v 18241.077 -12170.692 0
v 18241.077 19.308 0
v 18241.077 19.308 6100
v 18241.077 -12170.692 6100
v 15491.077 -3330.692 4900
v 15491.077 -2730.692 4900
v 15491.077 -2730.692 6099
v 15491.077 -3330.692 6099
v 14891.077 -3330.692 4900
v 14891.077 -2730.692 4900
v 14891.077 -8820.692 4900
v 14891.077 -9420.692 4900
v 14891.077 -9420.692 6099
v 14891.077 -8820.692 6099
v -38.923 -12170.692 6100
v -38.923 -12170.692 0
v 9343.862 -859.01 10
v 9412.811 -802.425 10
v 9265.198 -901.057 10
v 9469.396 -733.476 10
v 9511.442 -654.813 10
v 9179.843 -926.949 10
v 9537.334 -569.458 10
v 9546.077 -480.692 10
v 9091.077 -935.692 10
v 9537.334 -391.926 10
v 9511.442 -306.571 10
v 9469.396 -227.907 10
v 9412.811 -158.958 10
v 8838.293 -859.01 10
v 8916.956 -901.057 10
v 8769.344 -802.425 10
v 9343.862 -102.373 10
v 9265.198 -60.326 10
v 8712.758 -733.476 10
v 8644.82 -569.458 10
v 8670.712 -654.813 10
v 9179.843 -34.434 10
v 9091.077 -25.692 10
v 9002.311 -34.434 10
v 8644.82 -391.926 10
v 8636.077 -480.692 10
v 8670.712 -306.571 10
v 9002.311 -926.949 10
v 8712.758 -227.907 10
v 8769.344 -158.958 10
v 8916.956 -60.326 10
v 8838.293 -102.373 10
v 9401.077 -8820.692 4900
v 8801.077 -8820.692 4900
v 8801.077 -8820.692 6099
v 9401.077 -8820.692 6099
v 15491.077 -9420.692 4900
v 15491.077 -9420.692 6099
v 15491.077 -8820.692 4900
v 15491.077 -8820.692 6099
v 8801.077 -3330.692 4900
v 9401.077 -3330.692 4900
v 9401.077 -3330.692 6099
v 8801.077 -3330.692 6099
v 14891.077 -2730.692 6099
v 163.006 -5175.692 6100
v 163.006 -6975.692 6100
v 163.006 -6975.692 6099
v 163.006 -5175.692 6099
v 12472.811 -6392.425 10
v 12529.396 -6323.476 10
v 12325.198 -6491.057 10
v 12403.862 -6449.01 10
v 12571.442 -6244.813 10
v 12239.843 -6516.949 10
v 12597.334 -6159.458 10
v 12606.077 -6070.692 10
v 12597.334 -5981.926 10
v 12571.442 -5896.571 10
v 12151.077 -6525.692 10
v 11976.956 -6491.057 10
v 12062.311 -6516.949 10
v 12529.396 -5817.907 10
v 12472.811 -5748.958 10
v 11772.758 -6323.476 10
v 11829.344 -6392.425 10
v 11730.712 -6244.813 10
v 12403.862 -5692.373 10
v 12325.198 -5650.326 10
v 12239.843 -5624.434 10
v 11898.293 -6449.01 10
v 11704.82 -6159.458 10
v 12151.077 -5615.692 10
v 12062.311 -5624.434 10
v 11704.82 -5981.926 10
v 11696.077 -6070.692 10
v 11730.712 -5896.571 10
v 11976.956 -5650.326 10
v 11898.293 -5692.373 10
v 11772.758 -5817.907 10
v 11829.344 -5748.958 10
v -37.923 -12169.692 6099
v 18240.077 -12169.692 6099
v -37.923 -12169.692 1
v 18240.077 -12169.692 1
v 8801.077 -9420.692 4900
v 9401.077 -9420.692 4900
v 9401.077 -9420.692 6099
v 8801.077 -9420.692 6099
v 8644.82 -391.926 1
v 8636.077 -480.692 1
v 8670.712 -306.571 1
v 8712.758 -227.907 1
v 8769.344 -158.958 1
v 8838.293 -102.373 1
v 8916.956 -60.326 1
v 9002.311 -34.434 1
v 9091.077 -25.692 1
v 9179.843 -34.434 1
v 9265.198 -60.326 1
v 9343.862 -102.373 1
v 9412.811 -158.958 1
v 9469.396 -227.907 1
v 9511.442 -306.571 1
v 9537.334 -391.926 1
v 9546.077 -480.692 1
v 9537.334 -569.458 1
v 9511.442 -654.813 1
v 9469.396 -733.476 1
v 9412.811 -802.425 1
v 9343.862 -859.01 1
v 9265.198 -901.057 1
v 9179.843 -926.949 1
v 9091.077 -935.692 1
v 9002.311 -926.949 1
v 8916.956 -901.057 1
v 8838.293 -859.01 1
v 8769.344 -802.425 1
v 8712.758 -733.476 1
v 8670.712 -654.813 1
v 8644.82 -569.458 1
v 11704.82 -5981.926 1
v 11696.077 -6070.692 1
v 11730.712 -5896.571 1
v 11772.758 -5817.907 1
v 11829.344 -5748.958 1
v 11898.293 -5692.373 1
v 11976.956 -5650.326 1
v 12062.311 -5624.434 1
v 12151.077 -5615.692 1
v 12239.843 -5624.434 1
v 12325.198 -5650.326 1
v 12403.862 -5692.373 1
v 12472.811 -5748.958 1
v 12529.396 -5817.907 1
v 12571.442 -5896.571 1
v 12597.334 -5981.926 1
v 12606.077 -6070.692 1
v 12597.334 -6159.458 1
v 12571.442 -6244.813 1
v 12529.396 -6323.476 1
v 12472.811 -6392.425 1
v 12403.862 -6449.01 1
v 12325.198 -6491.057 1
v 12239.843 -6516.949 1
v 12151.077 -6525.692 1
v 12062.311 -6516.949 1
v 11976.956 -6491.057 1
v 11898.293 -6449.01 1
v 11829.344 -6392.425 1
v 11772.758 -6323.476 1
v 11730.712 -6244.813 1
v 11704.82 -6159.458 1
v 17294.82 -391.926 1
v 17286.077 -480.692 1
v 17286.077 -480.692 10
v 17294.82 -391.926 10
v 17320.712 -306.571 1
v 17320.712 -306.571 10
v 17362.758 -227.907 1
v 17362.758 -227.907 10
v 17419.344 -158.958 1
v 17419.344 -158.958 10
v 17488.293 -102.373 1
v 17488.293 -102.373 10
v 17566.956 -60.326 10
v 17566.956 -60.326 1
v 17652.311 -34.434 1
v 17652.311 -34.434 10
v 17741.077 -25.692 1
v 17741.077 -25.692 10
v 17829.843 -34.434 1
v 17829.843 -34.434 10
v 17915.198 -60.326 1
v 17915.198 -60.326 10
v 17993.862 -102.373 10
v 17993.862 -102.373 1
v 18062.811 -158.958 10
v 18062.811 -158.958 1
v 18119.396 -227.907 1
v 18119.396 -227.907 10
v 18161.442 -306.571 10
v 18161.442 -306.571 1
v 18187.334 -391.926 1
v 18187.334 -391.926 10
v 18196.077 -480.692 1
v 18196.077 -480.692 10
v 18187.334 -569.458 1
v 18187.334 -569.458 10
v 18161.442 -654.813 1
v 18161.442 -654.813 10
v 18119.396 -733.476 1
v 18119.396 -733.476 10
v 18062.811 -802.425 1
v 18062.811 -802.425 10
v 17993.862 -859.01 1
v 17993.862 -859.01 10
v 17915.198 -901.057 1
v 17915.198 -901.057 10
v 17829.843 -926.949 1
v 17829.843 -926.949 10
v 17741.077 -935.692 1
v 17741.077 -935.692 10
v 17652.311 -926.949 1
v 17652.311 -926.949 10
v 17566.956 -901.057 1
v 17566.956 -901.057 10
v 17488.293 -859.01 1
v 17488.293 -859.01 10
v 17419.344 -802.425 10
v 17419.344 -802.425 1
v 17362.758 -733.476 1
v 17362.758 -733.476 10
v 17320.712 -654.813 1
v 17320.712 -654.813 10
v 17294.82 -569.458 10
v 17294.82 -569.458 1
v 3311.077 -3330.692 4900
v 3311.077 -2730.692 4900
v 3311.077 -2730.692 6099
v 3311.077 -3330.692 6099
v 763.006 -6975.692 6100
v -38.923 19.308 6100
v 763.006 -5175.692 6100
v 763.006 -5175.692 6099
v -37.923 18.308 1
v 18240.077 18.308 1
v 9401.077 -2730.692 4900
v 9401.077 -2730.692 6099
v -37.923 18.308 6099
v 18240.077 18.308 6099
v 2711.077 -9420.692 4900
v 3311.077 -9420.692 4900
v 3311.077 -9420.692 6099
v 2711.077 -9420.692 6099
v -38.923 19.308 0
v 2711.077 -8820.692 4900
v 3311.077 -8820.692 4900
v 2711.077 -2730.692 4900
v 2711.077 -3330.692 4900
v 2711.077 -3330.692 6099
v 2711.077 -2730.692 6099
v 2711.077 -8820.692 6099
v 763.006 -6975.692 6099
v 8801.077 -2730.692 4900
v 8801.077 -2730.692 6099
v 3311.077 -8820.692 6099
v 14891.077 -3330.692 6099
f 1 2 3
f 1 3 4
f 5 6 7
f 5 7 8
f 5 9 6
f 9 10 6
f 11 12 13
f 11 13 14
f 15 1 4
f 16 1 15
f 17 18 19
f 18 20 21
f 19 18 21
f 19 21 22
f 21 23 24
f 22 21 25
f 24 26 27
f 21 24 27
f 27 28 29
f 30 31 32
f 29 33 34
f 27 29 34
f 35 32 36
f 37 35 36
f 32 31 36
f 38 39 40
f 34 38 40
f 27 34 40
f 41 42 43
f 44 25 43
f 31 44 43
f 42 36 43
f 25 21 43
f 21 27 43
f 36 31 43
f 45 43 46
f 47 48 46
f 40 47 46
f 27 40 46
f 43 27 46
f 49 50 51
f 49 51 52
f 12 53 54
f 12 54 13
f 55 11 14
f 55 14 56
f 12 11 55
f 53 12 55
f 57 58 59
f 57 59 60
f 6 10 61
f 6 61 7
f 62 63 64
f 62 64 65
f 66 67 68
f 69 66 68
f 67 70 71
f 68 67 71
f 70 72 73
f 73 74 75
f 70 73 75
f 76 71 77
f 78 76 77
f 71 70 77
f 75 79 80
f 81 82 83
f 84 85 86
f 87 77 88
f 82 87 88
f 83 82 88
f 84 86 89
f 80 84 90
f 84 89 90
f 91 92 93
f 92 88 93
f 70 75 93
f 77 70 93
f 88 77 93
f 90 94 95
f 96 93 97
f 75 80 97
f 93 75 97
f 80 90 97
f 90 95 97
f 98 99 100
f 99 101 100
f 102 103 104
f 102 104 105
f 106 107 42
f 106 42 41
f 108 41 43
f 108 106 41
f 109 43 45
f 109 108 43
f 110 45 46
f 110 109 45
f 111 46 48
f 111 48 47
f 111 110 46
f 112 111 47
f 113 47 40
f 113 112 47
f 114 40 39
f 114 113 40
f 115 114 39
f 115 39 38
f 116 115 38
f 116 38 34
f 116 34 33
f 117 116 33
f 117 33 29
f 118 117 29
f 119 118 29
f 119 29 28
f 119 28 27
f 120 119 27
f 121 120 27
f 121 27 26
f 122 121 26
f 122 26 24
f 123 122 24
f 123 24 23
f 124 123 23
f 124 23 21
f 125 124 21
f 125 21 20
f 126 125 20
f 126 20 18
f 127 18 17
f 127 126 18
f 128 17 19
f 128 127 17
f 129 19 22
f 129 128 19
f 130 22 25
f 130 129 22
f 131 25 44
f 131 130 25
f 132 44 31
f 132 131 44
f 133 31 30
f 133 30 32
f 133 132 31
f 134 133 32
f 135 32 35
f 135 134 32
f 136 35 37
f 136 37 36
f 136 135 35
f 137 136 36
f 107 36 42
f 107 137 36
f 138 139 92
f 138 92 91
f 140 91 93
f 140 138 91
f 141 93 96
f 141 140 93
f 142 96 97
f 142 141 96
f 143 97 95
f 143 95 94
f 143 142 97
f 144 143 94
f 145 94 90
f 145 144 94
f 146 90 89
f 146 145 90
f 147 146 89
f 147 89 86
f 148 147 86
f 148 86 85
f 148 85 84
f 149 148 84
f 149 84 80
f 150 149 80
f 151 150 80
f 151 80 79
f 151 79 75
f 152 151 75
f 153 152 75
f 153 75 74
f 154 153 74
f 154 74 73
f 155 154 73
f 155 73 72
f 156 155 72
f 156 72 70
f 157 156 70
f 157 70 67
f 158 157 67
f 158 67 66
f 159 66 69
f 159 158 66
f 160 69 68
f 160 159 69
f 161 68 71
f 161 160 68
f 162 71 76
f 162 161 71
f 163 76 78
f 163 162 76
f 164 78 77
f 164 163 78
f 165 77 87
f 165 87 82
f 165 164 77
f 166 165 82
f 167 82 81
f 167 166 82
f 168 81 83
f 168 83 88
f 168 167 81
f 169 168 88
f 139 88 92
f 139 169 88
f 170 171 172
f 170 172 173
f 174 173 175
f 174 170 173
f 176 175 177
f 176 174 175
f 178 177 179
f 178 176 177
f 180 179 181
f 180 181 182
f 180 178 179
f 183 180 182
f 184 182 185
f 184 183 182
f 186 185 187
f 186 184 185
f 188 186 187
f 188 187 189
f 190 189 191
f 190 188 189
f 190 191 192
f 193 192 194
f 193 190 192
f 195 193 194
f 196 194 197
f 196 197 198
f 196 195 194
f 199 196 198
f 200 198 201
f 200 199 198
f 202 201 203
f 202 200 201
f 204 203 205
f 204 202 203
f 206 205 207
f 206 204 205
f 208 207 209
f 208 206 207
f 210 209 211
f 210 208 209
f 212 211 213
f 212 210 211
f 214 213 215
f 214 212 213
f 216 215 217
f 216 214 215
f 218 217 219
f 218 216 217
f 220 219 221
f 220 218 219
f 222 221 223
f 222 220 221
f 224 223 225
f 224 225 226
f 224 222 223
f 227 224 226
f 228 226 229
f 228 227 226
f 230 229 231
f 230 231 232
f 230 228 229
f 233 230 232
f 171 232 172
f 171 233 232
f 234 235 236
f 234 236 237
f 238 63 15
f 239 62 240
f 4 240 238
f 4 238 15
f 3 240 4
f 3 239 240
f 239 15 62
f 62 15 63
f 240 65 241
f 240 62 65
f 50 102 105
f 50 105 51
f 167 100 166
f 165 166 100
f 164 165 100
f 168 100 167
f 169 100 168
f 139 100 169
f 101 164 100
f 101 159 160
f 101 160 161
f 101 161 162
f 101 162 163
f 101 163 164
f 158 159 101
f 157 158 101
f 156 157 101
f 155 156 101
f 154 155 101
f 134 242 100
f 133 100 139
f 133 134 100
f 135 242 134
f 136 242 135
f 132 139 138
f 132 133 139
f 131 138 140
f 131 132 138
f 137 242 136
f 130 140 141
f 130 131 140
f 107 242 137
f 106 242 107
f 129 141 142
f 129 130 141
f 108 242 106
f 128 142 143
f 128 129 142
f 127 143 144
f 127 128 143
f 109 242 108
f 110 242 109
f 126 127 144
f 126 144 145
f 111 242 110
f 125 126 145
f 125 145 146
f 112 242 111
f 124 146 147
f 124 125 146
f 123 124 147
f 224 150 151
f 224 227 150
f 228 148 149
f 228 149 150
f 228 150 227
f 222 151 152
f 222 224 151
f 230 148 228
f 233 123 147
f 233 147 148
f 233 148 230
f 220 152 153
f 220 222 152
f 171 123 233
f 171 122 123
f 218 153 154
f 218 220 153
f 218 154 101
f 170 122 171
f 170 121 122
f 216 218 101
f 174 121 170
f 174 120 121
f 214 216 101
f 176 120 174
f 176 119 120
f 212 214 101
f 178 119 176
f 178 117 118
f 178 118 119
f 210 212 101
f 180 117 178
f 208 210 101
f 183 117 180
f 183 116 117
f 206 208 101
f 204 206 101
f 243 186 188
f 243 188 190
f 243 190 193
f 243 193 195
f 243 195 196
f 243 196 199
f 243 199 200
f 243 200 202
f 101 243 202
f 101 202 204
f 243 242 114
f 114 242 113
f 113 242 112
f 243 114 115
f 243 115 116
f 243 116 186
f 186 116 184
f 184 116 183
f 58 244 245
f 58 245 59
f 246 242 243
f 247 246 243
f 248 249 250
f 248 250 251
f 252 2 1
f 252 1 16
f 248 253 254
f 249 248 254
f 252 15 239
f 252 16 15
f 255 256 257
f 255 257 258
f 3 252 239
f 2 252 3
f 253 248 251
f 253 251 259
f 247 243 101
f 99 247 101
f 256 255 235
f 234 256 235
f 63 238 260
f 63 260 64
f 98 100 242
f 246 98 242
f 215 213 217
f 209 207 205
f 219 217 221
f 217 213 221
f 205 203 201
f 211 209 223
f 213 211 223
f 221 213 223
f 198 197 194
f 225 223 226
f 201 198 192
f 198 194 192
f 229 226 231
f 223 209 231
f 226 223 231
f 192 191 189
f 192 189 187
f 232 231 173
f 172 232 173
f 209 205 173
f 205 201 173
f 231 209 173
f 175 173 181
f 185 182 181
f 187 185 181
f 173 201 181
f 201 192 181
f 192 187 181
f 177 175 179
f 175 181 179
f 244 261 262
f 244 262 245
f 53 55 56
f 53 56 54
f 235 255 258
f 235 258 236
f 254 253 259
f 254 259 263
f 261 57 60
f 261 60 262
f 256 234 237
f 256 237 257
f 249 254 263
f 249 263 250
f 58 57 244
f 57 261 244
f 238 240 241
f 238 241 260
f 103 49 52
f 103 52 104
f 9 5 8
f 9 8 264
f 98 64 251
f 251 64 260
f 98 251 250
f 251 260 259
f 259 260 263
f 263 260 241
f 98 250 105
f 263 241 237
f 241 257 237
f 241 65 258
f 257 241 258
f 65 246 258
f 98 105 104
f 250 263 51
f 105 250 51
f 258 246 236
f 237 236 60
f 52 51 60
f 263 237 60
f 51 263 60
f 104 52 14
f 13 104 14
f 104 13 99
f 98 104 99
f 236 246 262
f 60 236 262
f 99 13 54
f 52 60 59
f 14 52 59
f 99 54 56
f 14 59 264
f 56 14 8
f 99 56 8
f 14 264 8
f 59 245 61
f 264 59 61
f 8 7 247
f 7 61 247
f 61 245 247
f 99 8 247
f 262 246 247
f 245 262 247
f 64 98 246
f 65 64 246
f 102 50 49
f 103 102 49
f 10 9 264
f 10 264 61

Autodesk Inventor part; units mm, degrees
ref_plane "YZ Plane" through (0, 0, 0) normal (1, 0, 0) x (0, 1, 0)
ref_plane "XZ Plane" through (0, 0, 0) normal (0, 1, 0) x (-1, 0, 0)
ref_plane "XY Plane" through (0, 0, 0) normal (0, 0, 1) x (1, 0, 0)
sketch "Sketch1" plane through (0, 0, 0) normal (0, 0, 1) x (1, 0, 0)
  line L0 (-38.9229, 19.3084) -> (18241.0771, 19.3084)
  line L1 (18241.0771, 19.3084) -> (18241.0771, -12170.6916)
  line L2 (18241.0771, -12170.6916) -> (-38.9229, -12170.6916)
  line L3 (-38.9229, -12170.6916) -> (-38.9229, 19.3084)
  dimension "d0" = 18280
  dimension "d1" = 12190
extrude "Extrusion1" add sketch "Sketch1" along normal blind 6100
sketch "Sketch2" plane through (0, 0, 6100) normal (0, 0, 1) x (1, 0, 0)
  line L0 (18241.0771, 19.3084) -> (18241.0771, -12170.6916) projected
  line L1 (-38.9229, 19.3084) -> (18241.0771, 19.3084) projected
  line L2 (-38.9229, -12170.6916) -> (-38.9229, 19.3084) projected
  line L3 (18241.0771, -12170.6916) -> (-38.9229, -12170.6916) projected
  line L4 (163.0061, -5175.6916) -> (763.0061, -5175.6916)
  line L5 (763.0061, -5175.6916) -> (763.0061, -6975.6916)
  line L6 (763.0061, -6975.6916) -> (163.0061, -6975.6916)
  line L7 (163.0061, -6975.6916) -> (163.0061, -5175.6916)
  line L8 (2711.0771, -2730.6916) -> (3311.0771, -2730.6916)
  line L9 (3311.0771, -2730.6916) -> (3311.0771, -3330.6916)
  line L10 (3311.0771, -3330.6916) -> (2711.0771, -3330.6916)
  line L11 (2711.0771, -3330.6916) -> (2711.0771, -2730.6916)
  line L12 (8801.0771, -2730.6916) -> (9401.0771, -2730.6916)
  line L13 (9401.0771, -2730.6916) -> (9401.0771, -3330.6916)
  line L14 (9401.0771, -3330.6916) -> (8801.0771, -3330.6916)
  line L15 (8801.0771, -3330.6916) -> (8801.0771, -2730.6916)
  line L16 (14891.0771, -2730.6916) -> (15491.0771, -2730.6916)
  line L17 (15491.0771, -2730.6916) -> (15491.0771, -3330.6916)
  line L18 (15491.0771, -3330.6916) -> (14891.0771, -3330.6916)
  line L19 (14891.0771, -3330.6916) -> (14891.0771, -2730.6916)
  line L20 (2711.0771, -8820.6916) -> (3311.0771, -8820.6916)
  line L21 (3311.0771, -8820.6916) -> (3311.0771, -9420.6916)
  line L22 (3311.0771, -9420.6916) -> (2711.0771, -9420.6916)
  line L23 (2711.0771, -9420.6916) -> (2711.0771, -8820.6916)
  line L24 (8801.0771, -8820.6916) -> (9401.0771, -8820.6916)
  line L25 (9401.0771, -8820.6916) -> (9401.0771, -9420.6916)
  line L26 (9401.0771, -9420.6916) -> (8801.0771, -9420.6916)
  line L27 (8801.0771, -9420.6916) -> (8801.0771, -8820.6916)
  line L28 (14891.0771, -8820.6916) -> (15491.0771, -8820.6916)
  line L29 (15491.0771, -8820.6916) -> (15491.0771, -9420.6916)
  line L30 (15491.0771, -9420.6916) -> (14891.0771, -9420.6916)
  line L31 (14891.0771, -9420.6916) -> (14891.0771, -8820.6916)
  dimension "d4" = 600
  dimension "d5" = 600
  dimension "d6" = 2750
  dimension "d7" = 600
  dimension "d8" = 600
  dimension "d9" = 2750
  dimension "d10" = 2750
  dimension "d11" = 600
  dimension "d12" = 600
  dimension "d13" = 2750
  dimension "d14" = 2750
  dimension "d15" = 8840
  dimension "d16" = 600
  dimension "d17" = 600
  dimension "d18" = 2750
  dimension "d19" = 2750
  dimension "d20" = 600
  dimension "d21" = 600
  dimension "d22" = 2750
  dimension "d23" = 600
  dimension "d24" = 600
  dimension "d25" = 2750
  dimension "d26" = 2750
  dimension "d27" = 8840
  dimension "d28" = 1800
  dimension "d29" = 600
  dimension "d30" = 5195
shell "Shell1" thickness 1 removed faces 0
extrude "Extrusion2" cut sketch "Sketch2" against normal mid plane 1000 contours L4 L5 L6 L7
extrude "Extrusion3" add sketch "Sketch2" against normal blind 1200 contours L20 L21 L22 L23
extrude "Extrusion4" add sketch "Sketch2" against normal blind 1200 contours L24 L25 L26 L27
extrude "Extrusion5" add sketch "Sketch2" against normal blind 1200 contours L28 L29 L30 L31
extrude "Extrusion6" add sketch "Sketch2" against normal blind 1200 contours L8 L9 L10 L11
extrude "Extrusion7" add sketch "Sketch2" against normal blind 1200 contours L12 L13 L14 L15
extrude "Extrusion8" add sketch "Sketch2" against normal blind 1200 contours L16 L17 L18 L19
sketch "Sketch5" plane through (0, 0, 0) normal (0, 0, -1) x (-1, 0, 0)
  line L0 (38.9229, 19.3084) -> (-18241.0771, 19.3084) projected
  line L1 (-18241.0771, 19.3084) -> (-18241.0771, -12170.6916) projected
  line L2 (-18241.0771, -12170.6916) -> (38.9229, -12170.6916) projected
  line L3 (38.9229, -12170.6916) -> (38.9229, 19.3084) projected
  line L4 (-6981.0771, -3330.6916) -> (-5761.0771, -3330.6916)
  line L5 (-5761.0771, -3330.6916) -> (-5761.0771, -5310.6916)
  line L6 (-5761.0771, -5310.6916) -> (-6981.0771, -5310.6916)
  line L7 (-6981.0771, -5310.6916) -> (-6981.0771, -3330.6916)
  line L8 (-6981.0771, -3330.6916) -> (-8501.0771, -3330.6916)
  line L9 (-8501.0771, -3330.6916) -> (-8501.0771, -4550.6916)
  line L10 (-8501.0771, -4550.6916) -> (-6981.0771, -4550.6916)
  line L11 (-6981.0771, -4550.6916) -> (-6981.0771, -3330.6916)
  line L12 (-8501.0771, -3330.6916) -> (-9721.0771, -3330.6916)
  line L13 (-9721.0771, -3330.6916) -> (-9721.0771, -5310.6916)
  line L14 (-9721.0771, -5310.6916) -> (-8501.0771, -5310.6916)
  line L15 (-8501.0771, -5310.6916) -> (-8501.0771, -3330.6916)
  line L16 (-9721.0771, -3330.6916) -> (-10941.0771, -3330.6916)
  line L17 (-10941.0771, -3330.6916) -> (-10941.0771, -5300)
  line L18 (-10941.0771, -5300) -> (-9721.0771, -5300)
  line L19 (-9721.0771, -5300) -> (-9721.0771, -3330.6916)
  line L20 (-10941.0771, -3330.6916) -> (-12461.0771, -3330.6916)
  line L21 (-12461.0771, -3330.6916) -> (-12461.0771, -4550.6916)
  line L22 (-12461.0771, -4550.6916) -> (-10941.0771, -4550.6916)
  line L23 (-10941.0771, -4550.6916) -> (-10941.0771, -3330.6916)
  line L24 (-12461.0771, -3330.6916) -> (-13981.0771, -3330.6916)
  line L25 (-13981.0771, -3330.6916) -> (-13981.0771, -4550.6916)
  line L26 (-13981.0771, -4550.6916) -> (-12461.0771, -4550.6916)
  line L27 (-12461.0771, -4550.6916) -> (-12461.0771, -3330.6916)
  line L28 (-14741.0771, -4550.6916) -> (-13521.0771, -4550.6916)
  line L29 (-13521.0771, -4550.6916) -> (-13521.0771, -6070.6916)
  line L30 (-13521.0771, -6070.6916) -> (-14741.0771, -6070.6916)
  line L31 (-14741.0771, -6070.6916) -> (-14741.0771, -4550.6916)
  line L32 (-14741.0771, -6070.6916) -> (-13521.0771, -6070.6916)
  line L33 (-13521.0771, -6070.6916) -> (-13521.0771, -7590.6916)
  line L34 (-13521.0771, -7590.6916) -> (-14741.0771, -7590.6916)
  line L35 (-14741.0771, -7590.6916) -> (-14741.0771, -6070.6916)
  line L36 (-14741.0771, -7590.6916) -> (-13831.0771, -7590.6916)
  line L37 (-13831.0771, -7590.6916) -> (-13831.0771, -9110.6916)
  line L38 (-13831.0771, -9110.6916) -> (-14741.0771, -9110.6916)
  line L39 (-14741.0771, -9110.6916) -> (-14741.0771, -7590.6916)
  line L40 (-9800, -10950.6916) -> (-8280, -10950.6916)
  line L41 (-8280, -10950.6916) -> (-8280, -12170.6916)
  line L42 (-8280, -12170.6916) -> (-9800, -12170.6916)
  line L43 (-9800, -12170.6916) -> (-9800, -10950.6916)
  line L44 (-3461.0771, -5480.6916) -> (-4681.0771, -5480.6916)
  line L45 (-4681.0771, -5480.6916) -> (-4681.0771, -7310.6916)
  line L46 (-4681.0771, -7310.6916) -> (-3461.0771, -7310.6916)
  line L47 (-3461.0771, -7310.6916) -> (-3461.0771, -5480.6916)
  line L48 (-3461.0771, -7310.6916) -> (-4681.0771, -7310.6916)
  line L49 (-4681.0771, -7310.6916) -> (-4681.0771, -9140.6916)
  line L50 (-4681.0771, -9140.6916) -> (-3461.0771, -9140.6916)
  line L51 (-3461.0771, -9140.6916) -> (-3461.0771, -7310.6916)
  line L52 (-4681.0771, -5480.6916) -> (-5761.0771, -4320.6916)
  line L53 (-4681.0771, -5480.6916) -> (-3627.7417, -4500)
  line L54 (-3627.7417, -4500) -> (-4700.1477, -3348.1566)
  line L55 (-4700.1477, -3348.1566) -> (-5761.0771, -4320.6916)
  circle A0 centre (-12151.0771, -6070.6916) radius 455
  circle A1 centre (-9111.0771, -4300) radius 455
  circle A2 centre (-9091.0771, -480.6916) radius 455
  circle A3 centre (-17741.0771, -480.6916) radius 455
  dimension "d66" = 1220
  dimension "d67" = 1980
  dimension "d68" = 3350
  dimension "d69" = 5800
  dimension "d70" = 1520
  dimension "d71" = 1220
  dimension "d72" = 1220
  dimension "d73" = 1980
  dimension "d74" = 1220
  dimension "d75" = 1520
  dimension "d76" = 1220
  dimension "d77" = 1520
  dimension "d78" = 1520
  dimension "d79" = 1220
  dimension "d80" = 3500
  dimension "d81" = 4570
  dimension "d82" = 1220
  dimension "d83" = 1520
  dimension "d84" = 1220
  dimension "d85" = 1520
  dimension "d86" = 910
  dimension "d90" = 1520
  dimension "d91" = 1220
  dimension "d92" = 1830
  dimension "d93" = 1220
  dimension "d94" = 3500
  dimension "d95" = 5500
  dimension "d96" = 1830
  dimension "d97" = 1220
  dimension "d126" = 910
  dimension "d128" = 12190
  dimension "d129" = 910
  dimension "d130" = 610
  dimension "d137" = 910
  dimension "d138" = 9150
  dimension "d139" = 910
  dimension "d140" = 500
  dimension "d141" = 500
  dimension "d142" = 500
extrude "Extrusion23" add sketch "Sketch5" against normal blind 10 contours A0
extrude "Extrusion26" add sketch "Sketch5" against normal blind 10 contours A2
extrude "Extrusion27" add sketch "Sketch5" against normal blind 10 contours A3
properties part number "SNL_FM"
